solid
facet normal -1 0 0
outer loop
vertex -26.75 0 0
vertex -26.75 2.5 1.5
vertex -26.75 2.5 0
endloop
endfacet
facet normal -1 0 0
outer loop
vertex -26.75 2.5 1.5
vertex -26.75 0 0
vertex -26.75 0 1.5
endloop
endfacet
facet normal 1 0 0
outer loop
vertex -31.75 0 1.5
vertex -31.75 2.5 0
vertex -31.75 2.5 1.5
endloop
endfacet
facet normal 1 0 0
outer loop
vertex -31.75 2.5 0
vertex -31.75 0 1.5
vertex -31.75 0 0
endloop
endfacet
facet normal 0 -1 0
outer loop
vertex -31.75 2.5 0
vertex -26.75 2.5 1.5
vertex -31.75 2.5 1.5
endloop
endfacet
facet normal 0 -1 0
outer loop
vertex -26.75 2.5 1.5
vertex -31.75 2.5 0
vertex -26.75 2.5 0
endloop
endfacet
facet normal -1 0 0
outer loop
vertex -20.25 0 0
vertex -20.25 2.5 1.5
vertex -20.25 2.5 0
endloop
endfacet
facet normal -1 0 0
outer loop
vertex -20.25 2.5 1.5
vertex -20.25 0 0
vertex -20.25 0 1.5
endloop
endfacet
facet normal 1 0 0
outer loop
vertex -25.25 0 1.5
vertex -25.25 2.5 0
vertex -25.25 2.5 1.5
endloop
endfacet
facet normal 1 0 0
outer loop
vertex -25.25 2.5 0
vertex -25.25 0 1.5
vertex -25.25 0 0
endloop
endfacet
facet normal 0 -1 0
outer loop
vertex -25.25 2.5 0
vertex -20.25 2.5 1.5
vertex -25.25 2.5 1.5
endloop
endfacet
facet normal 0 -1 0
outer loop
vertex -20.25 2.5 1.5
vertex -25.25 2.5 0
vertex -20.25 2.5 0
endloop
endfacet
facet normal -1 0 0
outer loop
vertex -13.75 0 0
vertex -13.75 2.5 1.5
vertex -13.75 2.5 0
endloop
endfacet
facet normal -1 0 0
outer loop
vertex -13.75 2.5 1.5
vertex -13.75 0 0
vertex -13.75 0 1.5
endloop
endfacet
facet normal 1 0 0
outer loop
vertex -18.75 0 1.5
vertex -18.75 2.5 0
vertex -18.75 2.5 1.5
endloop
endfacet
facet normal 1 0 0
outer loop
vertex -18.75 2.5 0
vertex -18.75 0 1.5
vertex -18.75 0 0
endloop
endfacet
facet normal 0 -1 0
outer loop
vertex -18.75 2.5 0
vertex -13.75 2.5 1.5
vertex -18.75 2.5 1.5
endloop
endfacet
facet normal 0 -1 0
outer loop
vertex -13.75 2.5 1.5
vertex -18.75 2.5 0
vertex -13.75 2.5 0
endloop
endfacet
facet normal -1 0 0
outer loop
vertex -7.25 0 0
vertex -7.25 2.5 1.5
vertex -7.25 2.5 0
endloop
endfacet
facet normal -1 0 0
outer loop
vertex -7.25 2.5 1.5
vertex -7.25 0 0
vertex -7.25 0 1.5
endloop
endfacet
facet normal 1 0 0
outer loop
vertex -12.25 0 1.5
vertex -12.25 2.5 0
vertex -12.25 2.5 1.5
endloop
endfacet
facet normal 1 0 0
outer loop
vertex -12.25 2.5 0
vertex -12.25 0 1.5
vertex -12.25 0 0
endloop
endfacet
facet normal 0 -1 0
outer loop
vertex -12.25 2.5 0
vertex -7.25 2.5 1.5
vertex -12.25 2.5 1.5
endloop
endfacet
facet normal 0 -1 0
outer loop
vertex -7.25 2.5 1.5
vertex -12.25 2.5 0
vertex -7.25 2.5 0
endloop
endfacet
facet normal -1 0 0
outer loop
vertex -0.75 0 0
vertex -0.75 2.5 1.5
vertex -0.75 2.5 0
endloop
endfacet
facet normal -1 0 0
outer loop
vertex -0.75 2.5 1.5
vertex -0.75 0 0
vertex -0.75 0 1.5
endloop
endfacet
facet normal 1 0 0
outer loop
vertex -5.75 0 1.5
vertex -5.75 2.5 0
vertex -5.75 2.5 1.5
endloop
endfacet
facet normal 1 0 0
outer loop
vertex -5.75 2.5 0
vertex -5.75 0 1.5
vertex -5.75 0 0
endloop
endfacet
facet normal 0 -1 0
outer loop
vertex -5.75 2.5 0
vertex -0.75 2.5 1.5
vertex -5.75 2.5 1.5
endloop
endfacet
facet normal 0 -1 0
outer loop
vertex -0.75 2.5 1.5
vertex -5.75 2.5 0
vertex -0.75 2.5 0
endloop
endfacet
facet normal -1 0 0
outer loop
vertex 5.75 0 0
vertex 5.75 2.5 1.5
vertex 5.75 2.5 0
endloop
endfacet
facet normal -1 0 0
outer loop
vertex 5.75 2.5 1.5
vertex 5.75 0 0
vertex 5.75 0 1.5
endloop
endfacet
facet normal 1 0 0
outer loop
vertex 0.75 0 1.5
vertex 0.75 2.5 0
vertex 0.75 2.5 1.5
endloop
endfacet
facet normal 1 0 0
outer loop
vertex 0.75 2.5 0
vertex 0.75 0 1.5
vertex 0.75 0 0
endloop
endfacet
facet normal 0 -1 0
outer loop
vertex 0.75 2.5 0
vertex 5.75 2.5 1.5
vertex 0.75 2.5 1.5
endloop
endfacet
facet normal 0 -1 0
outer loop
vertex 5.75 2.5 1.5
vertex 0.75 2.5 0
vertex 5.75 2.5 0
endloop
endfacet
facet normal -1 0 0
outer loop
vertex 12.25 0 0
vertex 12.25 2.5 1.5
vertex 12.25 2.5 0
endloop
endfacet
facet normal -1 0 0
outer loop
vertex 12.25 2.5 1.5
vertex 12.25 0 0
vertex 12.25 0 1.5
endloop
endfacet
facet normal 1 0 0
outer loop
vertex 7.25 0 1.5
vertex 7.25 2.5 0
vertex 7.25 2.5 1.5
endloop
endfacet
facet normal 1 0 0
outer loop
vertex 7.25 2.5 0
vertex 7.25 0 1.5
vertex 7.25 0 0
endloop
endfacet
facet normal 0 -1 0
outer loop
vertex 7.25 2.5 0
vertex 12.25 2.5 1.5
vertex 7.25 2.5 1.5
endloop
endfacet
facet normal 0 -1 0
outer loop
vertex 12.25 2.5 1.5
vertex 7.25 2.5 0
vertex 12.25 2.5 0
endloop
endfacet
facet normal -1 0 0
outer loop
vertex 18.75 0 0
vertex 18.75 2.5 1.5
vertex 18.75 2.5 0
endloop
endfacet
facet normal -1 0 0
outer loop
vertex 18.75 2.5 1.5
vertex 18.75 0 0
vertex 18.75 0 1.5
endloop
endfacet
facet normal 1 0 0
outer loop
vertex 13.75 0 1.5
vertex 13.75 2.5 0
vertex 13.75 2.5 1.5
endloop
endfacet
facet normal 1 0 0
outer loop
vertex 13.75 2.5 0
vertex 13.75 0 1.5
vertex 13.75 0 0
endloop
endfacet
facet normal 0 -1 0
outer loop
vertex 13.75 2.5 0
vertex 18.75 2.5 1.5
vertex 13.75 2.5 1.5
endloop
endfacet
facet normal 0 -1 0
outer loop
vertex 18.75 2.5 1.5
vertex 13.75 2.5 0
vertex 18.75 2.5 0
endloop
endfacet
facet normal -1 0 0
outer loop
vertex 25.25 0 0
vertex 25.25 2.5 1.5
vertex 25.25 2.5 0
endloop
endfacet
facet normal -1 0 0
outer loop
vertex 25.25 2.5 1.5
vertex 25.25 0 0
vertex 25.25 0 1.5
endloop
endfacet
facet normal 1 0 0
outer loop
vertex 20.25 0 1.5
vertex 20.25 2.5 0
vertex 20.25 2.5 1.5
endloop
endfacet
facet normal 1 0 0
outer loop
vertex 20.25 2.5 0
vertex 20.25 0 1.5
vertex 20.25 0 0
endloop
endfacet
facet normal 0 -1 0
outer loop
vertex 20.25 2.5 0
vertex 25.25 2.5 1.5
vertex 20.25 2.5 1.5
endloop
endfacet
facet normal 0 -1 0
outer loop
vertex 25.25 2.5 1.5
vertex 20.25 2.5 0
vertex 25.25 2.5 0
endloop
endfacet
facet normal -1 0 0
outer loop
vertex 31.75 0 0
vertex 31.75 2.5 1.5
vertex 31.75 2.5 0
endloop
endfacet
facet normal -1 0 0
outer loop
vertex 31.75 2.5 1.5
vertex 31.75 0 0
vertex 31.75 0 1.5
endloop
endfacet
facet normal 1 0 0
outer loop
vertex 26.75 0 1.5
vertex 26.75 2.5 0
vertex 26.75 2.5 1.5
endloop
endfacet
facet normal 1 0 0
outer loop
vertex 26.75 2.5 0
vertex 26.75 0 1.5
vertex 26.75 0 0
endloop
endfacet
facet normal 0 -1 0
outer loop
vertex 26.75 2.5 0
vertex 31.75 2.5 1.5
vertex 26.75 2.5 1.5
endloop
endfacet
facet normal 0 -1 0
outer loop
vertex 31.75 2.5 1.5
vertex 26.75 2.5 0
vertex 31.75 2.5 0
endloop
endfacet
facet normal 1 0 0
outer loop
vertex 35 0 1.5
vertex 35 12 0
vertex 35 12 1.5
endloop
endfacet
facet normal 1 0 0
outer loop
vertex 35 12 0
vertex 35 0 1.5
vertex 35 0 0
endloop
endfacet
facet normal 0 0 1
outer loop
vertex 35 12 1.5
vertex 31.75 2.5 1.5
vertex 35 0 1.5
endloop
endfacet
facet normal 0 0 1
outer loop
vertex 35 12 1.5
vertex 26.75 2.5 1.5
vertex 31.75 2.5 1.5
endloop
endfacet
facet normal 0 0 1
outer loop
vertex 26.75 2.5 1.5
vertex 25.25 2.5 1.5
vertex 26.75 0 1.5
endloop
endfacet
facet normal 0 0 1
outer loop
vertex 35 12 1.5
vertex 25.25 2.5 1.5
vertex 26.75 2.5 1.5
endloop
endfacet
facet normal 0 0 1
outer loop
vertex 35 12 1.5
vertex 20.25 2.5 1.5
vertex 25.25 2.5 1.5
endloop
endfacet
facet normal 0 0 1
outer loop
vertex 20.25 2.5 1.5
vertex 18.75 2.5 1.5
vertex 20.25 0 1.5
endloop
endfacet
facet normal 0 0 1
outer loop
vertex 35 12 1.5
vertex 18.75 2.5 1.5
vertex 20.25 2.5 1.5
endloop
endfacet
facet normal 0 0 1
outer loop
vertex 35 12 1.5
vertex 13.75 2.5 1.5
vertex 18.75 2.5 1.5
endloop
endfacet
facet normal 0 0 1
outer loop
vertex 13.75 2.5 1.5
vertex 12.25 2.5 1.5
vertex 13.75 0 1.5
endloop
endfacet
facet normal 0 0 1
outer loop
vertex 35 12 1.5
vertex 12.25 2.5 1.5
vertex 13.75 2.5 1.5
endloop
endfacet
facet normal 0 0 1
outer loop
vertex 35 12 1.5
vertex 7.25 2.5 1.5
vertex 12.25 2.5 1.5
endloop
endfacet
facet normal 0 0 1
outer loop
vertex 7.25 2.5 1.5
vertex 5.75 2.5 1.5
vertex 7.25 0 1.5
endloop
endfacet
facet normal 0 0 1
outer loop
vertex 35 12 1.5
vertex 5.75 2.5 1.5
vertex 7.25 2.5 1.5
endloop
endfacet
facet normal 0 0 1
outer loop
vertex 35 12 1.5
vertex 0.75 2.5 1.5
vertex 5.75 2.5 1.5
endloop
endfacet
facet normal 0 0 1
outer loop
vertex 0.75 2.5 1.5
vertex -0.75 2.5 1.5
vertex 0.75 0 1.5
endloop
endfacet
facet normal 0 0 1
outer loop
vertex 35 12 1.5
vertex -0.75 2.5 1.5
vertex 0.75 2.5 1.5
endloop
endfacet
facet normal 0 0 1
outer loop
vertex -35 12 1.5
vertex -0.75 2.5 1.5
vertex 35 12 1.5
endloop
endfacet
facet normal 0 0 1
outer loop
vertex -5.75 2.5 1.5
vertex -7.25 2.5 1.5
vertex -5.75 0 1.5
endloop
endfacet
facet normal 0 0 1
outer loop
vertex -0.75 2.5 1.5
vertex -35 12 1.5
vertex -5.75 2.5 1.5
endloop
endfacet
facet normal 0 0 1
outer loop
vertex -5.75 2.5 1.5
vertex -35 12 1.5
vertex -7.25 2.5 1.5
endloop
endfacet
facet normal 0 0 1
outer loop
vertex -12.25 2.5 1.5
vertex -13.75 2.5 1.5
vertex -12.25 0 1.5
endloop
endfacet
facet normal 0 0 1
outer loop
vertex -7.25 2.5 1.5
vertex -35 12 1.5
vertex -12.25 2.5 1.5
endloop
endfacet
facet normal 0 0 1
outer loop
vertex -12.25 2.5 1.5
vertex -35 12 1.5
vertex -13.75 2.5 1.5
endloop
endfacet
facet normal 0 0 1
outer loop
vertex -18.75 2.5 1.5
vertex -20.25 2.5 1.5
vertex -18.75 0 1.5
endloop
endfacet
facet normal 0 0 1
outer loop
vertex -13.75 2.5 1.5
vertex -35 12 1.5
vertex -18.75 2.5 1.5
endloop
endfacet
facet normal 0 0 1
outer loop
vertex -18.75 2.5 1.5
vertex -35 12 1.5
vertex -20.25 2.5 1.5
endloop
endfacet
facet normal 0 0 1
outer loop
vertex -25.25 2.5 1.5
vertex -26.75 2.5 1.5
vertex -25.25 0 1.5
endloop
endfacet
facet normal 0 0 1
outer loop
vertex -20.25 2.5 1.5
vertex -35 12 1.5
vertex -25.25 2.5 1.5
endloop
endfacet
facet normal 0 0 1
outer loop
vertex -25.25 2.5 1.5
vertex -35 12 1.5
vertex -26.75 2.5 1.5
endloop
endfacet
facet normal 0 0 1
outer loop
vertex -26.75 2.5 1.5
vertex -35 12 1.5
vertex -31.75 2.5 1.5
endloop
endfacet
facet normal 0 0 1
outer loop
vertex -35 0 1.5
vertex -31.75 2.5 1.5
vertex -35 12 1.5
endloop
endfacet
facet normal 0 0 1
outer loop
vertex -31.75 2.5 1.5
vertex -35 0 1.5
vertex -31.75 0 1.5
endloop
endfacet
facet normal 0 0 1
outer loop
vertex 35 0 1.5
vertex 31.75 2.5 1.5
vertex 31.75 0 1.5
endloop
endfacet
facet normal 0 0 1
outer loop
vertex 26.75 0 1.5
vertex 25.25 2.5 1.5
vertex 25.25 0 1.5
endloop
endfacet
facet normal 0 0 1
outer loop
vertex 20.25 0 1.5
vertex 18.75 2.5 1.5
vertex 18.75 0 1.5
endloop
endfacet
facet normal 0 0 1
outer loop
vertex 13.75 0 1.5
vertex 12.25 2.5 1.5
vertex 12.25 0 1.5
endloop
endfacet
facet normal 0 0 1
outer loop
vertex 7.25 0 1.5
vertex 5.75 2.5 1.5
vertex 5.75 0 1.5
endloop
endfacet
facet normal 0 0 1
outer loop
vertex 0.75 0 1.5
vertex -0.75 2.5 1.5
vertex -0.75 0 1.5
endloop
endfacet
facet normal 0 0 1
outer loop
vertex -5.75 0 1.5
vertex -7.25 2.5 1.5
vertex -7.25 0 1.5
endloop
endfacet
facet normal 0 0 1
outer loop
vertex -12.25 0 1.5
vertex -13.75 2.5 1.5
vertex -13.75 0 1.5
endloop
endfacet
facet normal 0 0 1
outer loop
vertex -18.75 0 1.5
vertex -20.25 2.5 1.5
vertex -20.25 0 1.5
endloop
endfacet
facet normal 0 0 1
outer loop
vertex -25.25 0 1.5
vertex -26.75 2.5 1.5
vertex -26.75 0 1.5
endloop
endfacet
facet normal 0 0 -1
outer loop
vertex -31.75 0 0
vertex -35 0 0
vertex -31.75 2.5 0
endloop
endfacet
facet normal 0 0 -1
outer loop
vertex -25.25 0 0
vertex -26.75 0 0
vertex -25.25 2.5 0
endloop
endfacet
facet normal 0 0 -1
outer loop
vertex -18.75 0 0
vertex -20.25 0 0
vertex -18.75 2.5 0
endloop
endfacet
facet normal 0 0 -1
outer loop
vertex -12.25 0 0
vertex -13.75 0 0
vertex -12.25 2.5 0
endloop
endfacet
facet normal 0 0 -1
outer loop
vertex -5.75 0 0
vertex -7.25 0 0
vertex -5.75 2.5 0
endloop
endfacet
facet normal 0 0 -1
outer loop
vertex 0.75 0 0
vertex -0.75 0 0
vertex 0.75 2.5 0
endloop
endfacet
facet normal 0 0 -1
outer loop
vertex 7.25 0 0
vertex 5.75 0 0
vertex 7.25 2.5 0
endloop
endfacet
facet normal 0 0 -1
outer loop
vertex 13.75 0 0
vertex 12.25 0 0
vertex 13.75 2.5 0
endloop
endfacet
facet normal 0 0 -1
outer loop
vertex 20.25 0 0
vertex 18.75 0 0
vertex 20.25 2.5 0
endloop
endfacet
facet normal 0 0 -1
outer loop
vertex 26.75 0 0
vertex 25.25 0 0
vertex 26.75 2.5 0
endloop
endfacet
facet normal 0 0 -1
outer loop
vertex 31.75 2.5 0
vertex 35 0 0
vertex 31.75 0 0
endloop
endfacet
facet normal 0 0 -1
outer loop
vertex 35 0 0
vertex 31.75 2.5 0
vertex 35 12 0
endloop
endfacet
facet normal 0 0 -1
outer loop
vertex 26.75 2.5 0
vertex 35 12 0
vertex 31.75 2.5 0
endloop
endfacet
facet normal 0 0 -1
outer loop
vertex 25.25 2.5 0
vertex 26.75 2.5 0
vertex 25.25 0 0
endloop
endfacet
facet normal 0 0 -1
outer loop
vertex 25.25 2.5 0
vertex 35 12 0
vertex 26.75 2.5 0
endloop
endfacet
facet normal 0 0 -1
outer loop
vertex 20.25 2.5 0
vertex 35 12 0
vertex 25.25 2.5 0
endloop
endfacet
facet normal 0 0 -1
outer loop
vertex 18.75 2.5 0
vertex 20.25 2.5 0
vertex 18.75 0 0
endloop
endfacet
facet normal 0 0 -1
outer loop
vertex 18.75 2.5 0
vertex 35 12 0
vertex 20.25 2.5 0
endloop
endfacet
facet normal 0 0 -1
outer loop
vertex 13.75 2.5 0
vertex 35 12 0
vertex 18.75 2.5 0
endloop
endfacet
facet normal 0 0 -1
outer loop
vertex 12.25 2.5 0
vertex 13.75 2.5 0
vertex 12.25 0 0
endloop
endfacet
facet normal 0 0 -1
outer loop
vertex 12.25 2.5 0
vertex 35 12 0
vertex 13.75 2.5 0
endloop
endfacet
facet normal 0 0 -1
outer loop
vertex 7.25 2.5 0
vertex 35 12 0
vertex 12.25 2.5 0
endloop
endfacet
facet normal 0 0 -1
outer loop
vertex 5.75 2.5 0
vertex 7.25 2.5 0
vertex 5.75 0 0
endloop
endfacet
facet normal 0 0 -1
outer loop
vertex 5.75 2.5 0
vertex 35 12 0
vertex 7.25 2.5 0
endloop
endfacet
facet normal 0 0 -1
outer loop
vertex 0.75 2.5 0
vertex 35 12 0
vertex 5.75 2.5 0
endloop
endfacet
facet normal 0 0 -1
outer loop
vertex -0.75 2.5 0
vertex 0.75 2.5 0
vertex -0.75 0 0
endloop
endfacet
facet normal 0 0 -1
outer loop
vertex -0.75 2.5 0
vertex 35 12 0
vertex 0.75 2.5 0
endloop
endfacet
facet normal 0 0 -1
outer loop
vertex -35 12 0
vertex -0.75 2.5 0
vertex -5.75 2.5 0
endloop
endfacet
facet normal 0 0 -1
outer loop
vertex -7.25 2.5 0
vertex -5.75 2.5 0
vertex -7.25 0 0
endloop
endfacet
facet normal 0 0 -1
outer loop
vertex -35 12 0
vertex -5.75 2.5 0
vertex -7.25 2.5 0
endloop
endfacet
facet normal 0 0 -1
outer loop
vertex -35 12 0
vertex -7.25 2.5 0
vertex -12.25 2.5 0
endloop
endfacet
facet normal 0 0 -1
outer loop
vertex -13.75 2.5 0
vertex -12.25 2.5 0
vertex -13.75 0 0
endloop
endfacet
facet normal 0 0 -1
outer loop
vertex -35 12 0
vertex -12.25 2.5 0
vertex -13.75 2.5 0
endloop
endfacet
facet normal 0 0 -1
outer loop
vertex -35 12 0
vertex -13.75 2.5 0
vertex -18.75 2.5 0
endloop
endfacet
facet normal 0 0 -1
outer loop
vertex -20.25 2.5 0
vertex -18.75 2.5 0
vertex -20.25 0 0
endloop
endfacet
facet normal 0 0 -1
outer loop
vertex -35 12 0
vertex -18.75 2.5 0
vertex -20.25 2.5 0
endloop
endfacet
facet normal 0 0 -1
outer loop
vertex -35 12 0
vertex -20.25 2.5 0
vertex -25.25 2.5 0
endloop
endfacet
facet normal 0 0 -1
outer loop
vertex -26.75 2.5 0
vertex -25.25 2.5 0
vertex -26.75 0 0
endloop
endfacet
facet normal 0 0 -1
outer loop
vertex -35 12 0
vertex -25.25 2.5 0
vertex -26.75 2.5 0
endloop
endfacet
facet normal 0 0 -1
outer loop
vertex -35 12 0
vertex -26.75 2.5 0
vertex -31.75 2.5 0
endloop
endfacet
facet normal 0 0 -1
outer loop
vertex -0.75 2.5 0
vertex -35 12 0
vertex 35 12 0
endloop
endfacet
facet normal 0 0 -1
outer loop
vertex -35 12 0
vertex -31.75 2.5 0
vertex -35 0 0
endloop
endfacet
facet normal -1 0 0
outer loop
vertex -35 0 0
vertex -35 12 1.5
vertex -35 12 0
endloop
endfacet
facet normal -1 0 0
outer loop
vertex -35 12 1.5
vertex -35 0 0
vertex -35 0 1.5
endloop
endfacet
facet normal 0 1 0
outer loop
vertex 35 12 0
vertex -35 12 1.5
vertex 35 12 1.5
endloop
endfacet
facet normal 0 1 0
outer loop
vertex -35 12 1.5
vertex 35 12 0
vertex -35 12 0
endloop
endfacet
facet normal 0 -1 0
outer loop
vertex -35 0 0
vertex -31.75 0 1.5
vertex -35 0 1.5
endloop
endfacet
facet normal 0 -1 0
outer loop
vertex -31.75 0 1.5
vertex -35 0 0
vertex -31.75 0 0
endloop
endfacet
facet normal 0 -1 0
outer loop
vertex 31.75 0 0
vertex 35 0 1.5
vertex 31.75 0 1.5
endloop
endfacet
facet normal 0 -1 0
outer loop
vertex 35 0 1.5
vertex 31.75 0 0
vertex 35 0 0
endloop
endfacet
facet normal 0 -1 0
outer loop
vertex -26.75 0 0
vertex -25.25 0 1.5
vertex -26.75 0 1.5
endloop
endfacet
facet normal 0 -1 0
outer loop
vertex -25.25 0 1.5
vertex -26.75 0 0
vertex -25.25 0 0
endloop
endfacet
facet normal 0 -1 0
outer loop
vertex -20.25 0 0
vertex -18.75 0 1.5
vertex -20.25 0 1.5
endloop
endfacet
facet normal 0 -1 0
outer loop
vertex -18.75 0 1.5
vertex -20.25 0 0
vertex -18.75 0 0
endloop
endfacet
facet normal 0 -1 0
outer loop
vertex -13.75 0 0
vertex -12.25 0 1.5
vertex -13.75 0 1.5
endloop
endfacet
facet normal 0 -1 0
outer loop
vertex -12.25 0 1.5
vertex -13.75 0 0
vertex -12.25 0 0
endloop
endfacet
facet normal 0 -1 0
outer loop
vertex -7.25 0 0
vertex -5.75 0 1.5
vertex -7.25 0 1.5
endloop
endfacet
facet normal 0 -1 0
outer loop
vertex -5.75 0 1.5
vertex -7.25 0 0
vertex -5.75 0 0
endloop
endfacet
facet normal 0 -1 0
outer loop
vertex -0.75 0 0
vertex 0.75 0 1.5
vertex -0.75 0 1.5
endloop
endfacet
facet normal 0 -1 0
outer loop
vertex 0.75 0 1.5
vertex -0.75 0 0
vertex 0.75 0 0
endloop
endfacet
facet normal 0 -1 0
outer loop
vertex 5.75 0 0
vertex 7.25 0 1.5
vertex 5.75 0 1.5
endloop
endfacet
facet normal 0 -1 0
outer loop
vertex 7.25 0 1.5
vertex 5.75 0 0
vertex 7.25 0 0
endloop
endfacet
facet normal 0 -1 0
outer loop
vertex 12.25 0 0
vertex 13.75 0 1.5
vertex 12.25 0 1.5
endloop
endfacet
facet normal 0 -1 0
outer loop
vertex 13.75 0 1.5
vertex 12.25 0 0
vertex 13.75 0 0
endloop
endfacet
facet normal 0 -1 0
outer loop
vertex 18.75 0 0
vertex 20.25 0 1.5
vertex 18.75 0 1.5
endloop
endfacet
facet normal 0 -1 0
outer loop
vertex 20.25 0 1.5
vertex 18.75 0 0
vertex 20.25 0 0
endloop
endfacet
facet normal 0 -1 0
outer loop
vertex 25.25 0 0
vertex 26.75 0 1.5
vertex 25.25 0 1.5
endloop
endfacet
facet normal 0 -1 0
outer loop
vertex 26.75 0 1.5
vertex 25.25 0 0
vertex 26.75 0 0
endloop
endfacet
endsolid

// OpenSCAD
// 10-well agarose gel comb, printed lying flat
// Units: mm

// ---------- Parameters ----------
comb_length    = 70;    // spine length (X)
comb_width     = 12;    // spine width (Y)
comb_thickness = 1.5;   // plate thickness (Z)

tooth_count    = 10;    // number of teeth
tooth_width    = 5.0;   // tooth width (X)
tooth_length   = 12;    // tooth length (Y)
tooth_overlap  = 1.5;   // gap between neighbouring teeth (X)

eps            = 0.5;   // cutter overshoot past faces
$fn            = 64;    // curve resolution

// ---------- Derived ----------
pitch      = tooth_width + tooth_overlap;
row_offset = -(tooth_count - 1) * pitch / 2;   // centre row on origin in X

// ---------- Model ----------
difference() {
    // Base plate (spine + teeth top faces)
    translate([-comb_length / 2, 0, 0])
        cube([comb_length, comb_width, comb_thickness]);

    // Teeth, hanging from -Y edge
    for (i = [0 : tooth_count - 1])
        translate([row_offset + i * pitch - tooth_width / 2,
                   -tooth_length,
                   -eps])
            cube([tooth_width, tooth_length + comb_thickness + 2 * eps,
                  comb_thickness + 2 * eps]);
}
